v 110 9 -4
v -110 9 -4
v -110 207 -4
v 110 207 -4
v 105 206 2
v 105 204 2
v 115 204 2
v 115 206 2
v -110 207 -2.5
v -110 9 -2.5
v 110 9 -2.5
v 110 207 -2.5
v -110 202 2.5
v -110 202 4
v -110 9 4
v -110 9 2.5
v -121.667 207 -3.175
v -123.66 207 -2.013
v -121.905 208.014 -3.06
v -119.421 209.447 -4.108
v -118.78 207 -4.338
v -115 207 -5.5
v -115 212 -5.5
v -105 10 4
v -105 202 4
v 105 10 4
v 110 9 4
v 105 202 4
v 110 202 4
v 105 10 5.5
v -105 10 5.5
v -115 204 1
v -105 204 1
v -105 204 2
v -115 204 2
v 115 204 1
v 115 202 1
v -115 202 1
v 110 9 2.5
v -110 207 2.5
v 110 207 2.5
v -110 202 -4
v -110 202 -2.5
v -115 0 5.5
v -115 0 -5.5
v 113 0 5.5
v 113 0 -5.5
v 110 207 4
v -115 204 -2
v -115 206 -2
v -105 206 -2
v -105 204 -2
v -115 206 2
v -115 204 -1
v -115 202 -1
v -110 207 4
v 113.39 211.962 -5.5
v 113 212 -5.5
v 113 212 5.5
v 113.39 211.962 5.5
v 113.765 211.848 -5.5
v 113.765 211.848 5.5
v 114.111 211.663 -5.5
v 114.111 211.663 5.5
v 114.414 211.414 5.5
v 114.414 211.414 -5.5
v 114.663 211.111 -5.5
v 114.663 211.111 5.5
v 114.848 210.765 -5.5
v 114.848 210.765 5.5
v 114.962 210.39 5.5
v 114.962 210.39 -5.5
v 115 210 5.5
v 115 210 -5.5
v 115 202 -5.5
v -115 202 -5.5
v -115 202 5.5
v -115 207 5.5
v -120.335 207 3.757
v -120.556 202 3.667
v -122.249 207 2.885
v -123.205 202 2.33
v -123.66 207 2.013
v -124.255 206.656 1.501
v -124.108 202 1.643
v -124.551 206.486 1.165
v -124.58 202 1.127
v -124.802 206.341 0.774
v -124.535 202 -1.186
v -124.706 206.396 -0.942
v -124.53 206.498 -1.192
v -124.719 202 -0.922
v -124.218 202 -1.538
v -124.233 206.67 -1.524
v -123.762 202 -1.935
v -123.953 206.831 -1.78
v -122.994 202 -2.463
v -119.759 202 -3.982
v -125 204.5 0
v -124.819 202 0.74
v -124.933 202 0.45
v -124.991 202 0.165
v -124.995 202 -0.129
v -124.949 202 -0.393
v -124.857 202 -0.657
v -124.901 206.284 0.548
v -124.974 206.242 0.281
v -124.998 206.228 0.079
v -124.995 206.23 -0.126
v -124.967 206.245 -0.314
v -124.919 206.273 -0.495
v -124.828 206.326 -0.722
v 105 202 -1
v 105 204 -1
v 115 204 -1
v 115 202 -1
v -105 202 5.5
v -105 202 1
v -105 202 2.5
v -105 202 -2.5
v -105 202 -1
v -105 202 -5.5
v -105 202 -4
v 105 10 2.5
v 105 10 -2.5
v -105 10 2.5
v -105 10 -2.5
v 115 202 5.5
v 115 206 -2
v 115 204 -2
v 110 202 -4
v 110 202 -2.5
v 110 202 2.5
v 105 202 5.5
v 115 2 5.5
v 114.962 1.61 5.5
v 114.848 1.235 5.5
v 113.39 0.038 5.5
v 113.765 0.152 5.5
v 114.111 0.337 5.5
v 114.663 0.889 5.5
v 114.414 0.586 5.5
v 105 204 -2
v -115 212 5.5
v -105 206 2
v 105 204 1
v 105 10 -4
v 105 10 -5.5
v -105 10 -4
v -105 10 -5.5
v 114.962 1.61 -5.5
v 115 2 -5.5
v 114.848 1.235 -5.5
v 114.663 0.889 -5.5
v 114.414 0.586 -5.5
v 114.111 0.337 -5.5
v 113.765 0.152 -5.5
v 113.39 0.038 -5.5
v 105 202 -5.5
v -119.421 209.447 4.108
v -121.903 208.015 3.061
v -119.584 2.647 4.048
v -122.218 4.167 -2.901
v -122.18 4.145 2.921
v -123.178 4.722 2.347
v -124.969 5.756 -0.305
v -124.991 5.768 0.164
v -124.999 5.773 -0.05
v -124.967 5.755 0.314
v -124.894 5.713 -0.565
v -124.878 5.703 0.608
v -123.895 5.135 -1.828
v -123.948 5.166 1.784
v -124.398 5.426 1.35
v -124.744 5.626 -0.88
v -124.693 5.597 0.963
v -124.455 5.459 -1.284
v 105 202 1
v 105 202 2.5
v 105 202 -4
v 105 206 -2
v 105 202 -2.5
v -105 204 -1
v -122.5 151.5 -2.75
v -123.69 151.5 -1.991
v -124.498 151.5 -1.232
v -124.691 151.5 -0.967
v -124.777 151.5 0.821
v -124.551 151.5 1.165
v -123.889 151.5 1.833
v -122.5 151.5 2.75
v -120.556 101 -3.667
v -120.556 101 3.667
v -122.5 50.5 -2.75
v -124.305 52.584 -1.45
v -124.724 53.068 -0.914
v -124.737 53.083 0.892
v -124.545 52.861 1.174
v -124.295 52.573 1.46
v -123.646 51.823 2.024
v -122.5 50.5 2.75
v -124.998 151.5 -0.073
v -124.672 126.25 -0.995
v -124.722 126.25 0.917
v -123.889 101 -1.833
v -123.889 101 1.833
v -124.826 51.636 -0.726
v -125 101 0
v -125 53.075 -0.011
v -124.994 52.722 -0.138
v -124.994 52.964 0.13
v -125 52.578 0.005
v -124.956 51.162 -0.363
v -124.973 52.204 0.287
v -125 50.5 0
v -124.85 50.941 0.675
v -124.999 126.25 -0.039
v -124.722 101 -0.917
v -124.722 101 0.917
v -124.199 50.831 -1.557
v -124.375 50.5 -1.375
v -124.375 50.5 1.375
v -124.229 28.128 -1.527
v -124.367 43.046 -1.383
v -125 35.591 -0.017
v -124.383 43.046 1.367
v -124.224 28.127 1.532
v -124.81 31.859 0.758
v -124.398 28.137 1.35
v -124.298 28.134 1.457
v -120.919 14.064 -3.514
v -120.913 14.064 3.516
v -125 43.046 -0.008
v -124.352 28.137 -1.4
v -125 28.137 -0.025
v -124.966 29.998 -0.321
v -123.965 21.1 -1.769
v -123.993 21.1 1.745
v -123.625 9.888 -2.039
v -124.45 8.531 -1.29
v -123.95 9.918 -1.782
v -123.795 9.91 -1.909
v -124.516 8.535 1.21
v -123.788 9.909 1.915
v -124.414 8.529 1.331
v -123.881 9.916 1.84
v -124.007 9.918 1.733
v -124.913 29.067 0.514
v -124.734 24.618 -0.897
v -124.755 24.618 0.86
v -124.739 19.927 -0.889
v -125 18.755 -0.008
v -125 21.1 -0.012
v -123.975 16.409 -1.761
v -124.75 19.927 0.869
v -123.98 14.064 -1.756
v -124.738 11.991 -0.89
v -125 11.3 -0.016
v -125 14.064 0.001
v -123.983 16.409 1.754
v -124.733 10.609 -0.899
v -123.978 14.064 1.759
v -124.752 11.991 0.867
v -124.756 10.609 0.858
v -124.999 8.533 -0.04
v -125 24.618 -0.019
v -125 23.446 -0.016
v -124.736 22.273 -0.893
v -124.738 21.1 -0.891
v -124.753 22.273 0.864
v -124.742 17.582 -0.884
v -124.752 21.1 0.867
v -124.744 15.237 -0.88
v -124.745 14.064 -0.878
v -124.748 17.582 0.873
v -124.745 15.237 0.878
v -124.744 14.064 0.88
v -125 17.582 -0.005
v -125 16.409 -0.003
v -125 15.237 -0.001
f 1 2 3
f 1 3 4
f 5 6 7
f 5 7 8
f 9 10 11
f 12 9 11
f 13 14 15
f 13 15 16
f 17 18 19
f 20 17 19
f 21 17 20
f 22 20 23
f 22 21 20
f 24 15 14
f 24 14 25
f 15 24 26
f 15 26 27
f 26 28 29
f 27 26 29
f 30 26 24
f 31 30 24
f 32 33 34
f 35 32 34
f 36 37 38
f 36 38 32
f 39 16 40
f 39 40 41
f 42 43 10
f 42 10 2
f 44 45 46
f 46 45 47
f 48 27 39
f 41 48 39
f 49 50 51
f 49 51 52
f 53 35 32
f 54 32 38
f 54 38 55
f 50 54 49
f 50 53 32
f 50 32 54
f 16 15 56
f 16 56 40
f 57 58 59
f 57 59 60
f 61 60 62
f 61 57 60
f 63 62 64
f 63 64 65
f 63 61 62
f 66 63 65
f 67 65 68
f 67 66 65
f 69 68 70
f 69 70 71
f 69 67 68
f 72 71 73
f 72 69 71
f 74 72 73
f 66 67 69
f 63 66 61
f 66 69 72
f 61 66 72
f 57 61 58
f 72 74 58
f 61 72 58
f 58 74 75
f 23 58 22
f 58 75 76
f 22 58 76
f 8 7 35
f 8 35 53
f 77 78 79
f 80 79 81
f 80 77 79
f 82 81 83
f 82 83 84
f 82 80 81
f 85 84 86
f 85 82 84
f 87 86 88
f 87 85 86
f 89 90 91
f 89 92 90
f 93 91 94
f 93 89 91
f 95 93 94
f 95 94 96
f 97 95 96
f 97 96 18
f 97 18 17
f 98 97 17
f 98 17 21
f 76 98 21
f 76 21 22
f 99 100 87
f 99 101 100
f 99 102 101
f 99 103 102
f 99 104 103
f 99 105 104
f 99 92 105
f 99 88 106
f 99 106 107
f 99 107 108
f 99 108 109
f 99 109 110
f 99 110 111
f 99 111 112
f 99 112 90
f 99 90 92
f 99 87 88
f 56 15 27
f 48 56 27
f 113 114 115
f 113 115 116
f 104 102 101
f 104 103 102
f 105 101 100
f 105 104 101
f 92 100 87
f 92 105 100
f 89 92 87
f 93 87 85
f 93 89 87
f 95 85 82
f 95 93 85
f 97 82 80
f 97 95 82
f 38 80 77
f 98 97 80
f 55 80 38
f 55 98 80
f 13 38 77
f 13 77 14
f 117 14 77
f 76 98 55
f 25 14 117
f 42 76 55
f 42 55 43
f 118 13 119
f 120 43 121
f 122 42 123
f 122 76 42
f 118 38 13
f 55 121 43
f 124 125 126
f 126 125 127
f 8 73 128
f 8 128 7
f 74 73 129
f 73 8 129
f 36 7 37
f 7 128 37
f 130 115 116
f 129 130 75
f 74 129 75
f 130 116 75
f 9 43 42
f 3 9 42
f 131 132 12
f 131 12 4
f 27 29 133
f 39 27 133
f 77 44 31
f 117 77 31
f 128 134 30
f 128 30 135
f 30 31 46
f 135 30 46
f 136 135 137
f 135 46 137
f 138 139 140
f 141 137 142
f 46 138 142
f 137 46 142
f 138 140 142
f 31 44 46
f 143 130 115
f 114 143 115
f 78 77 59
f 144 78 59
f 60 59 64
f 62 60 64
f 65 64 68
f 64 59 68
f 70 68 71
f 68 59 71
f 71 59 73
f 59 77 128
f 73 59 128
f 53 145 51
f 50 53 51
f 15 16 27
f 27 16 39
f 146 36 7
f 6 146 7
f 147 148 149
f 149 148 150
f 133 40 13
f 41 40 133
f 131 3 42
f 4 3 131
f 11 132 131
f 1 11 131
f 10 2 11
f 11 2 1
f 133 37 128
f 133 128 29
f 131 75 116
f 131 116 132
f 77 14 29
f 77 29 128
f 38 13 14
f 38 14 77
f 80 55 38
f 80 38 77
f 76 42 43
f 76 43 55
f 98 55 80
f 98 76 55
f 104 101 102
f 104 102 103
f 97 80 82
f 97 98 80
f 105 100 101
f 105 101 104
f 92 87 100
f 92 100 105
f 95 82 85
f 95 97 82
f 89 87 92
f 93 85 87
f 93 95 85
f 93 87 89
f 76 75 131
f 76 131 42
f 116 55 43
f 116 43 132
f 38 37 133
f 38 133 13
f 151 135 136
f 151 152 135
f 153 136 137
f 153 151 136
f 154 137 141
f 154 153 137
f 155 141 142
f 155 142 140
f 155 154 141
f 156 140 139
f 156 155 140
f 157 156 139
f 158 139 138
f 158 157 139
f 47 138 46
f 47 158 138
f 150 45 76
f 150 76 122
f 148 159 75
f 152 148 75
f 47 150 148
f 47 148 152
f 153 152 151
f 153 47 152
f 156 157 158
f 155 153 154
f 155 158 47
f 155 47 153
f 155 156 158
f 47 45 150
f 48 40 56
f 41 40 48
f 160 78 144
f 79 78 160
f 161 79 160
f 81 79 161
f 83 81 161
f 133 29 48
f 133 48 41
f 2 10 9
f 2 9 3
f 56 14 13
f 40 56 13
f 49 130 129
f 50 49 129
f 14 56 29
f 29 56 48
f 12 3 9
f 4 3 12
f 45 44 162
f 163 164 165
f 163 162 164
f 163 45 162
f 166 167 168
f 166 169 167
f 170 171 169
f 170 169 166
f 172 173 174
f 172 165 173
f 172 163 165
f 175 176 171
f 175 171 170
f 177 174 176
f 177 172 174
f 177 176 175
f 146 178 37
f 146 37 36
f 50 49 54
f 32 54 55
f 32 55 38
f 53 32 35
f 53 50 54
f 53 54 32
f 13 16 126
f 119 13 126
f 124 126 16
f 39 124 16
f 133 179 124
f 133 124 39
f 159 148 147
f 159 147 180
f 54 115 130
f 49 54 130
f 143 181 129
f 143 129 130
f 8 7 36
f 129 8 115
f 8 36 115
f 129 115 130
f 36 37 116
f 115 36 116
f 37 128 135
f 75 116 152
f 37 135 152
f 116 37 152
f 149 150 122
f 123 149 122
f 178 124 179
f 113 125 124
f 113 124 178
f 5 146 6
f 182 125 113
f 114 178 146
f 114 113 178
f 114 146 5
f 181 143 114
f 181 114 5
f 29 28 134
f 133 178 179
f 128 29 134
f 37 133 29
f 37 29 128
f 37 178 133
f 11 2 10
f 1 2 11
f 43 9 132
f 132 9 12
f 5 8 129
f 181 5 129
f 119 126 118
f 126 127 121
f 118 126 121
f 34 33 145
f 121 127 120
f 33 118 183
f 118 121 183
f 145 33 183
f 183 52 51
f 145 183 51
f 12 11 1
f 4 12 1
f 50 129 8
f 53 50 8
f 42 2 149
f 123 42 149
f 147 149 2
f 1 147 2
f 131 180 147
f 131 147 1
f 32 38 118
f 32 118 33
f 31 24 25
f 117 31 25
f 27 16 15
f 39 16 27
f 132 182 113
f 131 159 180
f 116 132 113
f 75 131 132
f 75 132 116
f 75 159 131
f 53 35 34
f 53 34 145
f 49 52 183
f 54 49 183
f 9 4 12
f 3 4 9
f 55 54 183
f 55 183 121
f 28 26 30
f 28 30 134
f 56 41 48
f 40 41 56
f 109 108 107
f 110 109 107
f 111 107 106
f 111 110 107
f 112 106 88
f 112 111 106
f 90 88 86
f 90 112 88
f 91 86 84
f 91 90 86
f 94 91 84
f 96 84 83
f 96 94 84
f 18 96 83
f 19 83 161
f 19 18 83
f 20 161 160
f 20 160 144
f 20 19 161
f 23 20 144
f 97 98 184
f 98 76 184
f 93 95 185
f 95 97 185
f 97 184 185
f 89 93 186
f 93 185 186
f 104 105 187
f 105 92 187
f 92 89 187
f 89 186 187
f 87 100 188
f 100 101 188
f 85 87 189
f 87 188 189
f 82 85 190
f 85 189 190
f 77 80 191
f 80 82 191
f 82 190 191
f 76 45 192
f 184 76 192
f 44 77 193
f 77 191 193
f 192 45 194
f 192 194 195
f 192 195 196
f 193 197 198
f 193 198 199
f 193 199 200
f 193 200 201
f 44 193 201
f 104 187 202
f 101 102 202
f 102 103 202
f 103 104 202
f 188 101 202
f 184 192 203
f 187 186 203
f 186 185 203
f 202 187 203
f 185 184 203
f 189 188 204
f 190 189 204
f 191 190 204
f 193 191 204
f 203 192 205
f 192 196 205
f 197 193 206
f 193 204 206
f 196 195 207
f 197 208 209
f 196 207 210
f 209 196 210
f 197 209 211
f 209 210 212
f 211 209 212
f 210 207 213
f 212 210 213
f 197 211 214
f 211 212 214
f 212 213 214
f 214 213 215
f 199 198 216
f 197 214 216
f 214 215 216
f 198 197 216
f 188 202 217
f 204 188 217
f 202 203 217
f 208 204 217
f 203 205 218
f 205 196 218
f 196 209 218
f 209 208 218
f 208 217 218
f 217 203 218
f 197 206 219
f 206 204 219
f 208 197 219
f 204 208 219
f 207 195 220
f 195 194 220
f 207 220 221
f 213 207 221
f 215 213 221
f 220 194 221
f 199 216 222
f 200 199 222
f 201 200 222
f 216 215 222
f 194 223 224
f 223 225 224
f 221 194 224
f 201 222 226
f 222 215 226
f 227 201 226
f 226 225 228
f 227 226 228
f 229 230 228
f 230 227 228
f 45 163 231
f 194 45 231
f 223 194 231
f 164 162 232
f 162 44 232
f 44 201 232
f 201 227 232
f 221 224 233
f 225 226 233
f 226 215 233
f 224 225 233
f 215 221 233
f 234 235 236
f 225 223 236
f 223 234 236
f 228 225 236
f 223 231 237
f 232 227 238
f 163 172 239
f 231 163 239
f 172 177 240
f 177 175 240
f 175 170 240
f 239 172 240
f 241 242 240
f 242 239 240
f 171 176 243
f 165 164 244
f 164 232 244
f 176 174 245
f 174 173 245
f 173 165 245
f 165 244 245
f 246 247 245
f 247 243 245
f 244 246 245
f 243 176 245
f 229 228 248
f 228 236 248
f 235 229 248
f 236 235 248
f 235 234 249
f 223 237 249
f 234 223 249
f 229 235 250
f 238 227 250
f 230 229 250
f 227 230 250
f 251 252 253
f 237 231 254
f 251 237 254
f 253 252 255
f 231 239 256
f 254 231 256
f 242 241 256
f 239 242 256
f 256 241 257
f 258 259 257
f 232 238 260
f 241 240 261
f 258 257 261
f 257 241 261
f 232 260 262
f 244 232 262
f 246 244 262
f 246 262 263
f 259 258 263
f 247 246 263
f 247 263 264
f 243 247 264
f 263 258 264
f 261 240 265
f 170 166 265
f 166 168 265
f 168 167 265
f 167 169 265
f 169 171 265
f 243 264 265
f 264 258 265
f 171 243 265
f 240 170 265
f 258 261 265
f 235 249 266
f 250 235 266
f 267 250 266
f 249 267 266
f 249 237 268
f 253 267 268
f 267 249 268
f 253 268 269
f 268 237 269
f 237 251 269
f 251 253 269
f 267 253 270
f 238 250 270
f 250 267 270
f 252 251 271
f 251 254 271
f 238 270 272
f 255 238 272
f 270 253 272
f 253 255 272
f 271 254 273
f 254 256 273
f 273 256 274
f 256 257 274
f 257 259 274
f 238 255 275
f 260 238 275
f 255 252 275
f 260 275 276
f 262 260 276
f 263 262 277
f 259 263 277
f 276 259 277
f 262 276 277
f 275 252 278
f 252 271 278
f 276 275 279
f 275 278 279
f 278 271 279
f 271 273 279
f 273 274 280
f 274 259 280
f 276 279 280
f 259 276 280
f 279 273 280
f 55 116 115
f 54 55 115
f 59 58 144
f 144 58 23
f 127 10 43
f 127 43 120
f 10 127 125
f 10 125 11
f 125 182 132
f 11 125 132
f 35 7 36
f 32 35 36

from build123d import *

# Parameters (mm, degrees)
SKETCH_2_W                 = 230
SKETCH_2_H                 = 11
EXTRUDE_1_DEPTH            = 212
SKETCH_3_W                 = 220
SKETCH_3_H                 = 1.5
CUT_EXTRUDE_1_DEPTH        = 198
SKETCH_4_W                 = 210
SKETCH_4_H                 = 192
CUT_EXTRUDE_2_DEPTH        = 203
EXTRUDE_2_DEPTH            = 212
DRAFT_START                = -7
DRAFT_4_DEPTH              = 14
SKETCH_6_W                 = 220
SKETCH_6_H                 = 1.5
EXTRUDE_3_DEPTH            = 198
EXTRUDE_3_2_DEPTH          = 198
FILLET_4_R                 = 2
SPLIT_START                = -2.5
SPLIT_BODIES_2_OUTLINE_W   = 220
SPLIT_BODIES_2_OUTLINE_H   = 5
SPLIT_BODIES_2_DEPTH       = 5
SPLIT_START_2              = -5.5
SPLIT_BODIES_2_2_OUTLINE_W = 220
SPLIT_BODIES_2_2_OUTLINE_H = 5
SPLIT_BODIES_2_2_DEPTH     = 1.5
SPLIT_START_3              = 4
SPLIT_BODIES_2_3_OUTLINE_W = 220
SPLIT_BODIES_2_3_OUTLINE_H = 5
SPLIT_BODIES_2_3_DEPTH     = 1.5
SPLIT_START_4              = 207
SPLIT_BODIES_2_4_DEPTH     = 5
SPLIT_START_5              = 202
SPLIT_BODIES_2_5_OUTLINE_W = 5
SPLIT_BODIES_2_5_OUTLINE_H = 11
SPLIT_BODIES_2_5_DEPTH     = 5
SPLIT_START_6              = -6
SPLIT_BODIES_2_6_DEPTH     = 12
SPLIT_BODIES_2_7_DEPTH     = 10
SKETCH_7_W                 = 2
SKETCH_7_H                 = 4
SKETCH_7_W_2               = 4
SKETCH_7_H_2               = 2
CUT_EXTRUDE_3_DEPTH        = 230
EXTRUDE_4_DEPTH            = 10
PATTERN_LINEAR_1_COUNT     = 2
PATTERN_LINEAR_1_PITCH     = 220


with BuildPart() as part:
    # Эскиз2 → Бобышка-Вытянуть1 (new body)
    with BuildSketch(Plane(origin=(0, 0, 0), x_dir=(1, 0, 0), z_dir=(0, 1, 0))):
        Rectangle(SKETCH_2_W, SKETCH_2_H)
    extrude(amount=EXTRUDE_1_DEPTH)

    # Эскиз3 → Вырез-Вытянуть1 (cut)
    with BuildSketch(Plane(origin=(0, 207, 0), x_dir=(1, 0, 0), z_dir=(0, 1, 0))):
        with Locations((0, 3.25)):
            Rectangle(SKETCH_3_W, SKETCH_3_H)
        with Locations((0, -3.25)):
            Rectangle(SKETCH_3_W, SKETCH_3_H)
    extrude(amount=-CUT_EXTRUDE_1_DEPTH, mode=Mode.SUBTRACT)

    # Эскиз4 → Вырез-Вытянуть2 (cut)
    with BuildSketch(Plane(origin=(0, 0, -5.5), x_dir=(-1, 0, 0), z_dir=(0, 0, -1))):
        with Locations((0, 106)):
            Rectangle(SKETCH_4_W, SKETCH_4_H)
    extrude(amount=-CUT_EXTRUDE_2_DEPTH, mode=Mode.SUBTRACT)


with BuildPart() as body_2:
    # Эскиз5 → Бобышка-Вытянуть2 (new body)
    with BuildSketch(Plane(origin=(0, 0, 0), x_dir=(-1, 0, 0), z_dir=(0, -1, 0))):
        with BuildLine():
            Line((115, -5.5), (115, 5.5))
            add(Edge.make_bspline(
                [(115, 5.5), (135, 0), (115, -5.5)],
                knots=[0, 0, 0, 1, 1, 1], degree=2))
        make_face()
    extrude(amount=-EXTRUDE_2_DEPTH)

    # Уклон4: read off the stored shape, not the designer's step
    # Уклон4 outline → Уклон4 (cut)
    with BuildSketch(Plane.XY.offset(DRAFT_START)):
        Polygon((-124.999999877, 206.226497379), (-115, 212), (-127, 212), (-127, 205.07179677), align=None)
        Polygon((-124.999999877, 5.773502621), (-127, 6.92820323), (-127, 0), (-115, 0), align=None)
    extrude(amount=DRAFT_4_DEPTH, mode=Mode.SUBTRACT)


with BuildPart() as part_1:
    add(part.part)

    # Combine 1: read off the stored shape, not the designer's step
    # Combine 1: union body 2
    add(body_2.part)

    # Скругление4
    fillet_4_edges = [part_1.edges().sort_by_distance(p)[0] for p in [
        (115, 0, 0),
        (115, 212, 0),
    ]]
    fillet(fillet_4_edges, radius=FILLET_4_R)

    # Split Bodies 2 7 outline → Split Bodies 2 7 (cut)
    with BuildSketch(Plane(origin=(0, 0, 0), x_dir=(1, 0, 0), z_dir=(0, 1, 0)).offset(SPLIT_START_5)):
        with BuildLine():
            Line((115, 5.5), (-115, 5.5))
            add(Edge.make_bspline(
                [(-115, -5.5), (-135, 0), (-115, 5.5)],
                knots=[0, 0, 0, 1, 1, 1], degree=2))
            Line((-115, -5.5), (115, -5.5))
            Line((115, -5.5), (115, 5.5))
        make_face()
    extrude(amount=SPLIT_BODIES_2_7_DEPTH, mode=Mode.SUBTRACT)

    # Эскиз8 → Бобышка-Вытянуть4 (add)
    with BuildSketch(Plane(origin=(115, 0, 0), x_dir=(0, 0, -1), z_dir=(1, 0, 0))):
        Polygon((-1, 202), (-1, 204), (-2, 204), (-2, 206), (2, 206), (2, 204), (1, 204), (1, 202), align=None)
    extrude_4 = extrude(amount=-EXTRUDE_4_DEPTH)

    # Линейный массив1: Бобышка-Вытянуть4 ×2
    with Locations(*[(-i * PATTERN_LINEAR_1_PITCH, 0, 0) for i in range(1, PATTERN_LINEAR_1_COUNT)]):
        add(extrude_4)


with BuildPart() as body_2_2:
    # Эскиз6 → Бобышка-Вытянуть3 (new body)
    with BuildSketch(Plane(origin=(0, 9, 0), x_dir=(1, 0, 0), z_dir=(0, 1, 0))):
        with Locations((0, 3.25)):
            Rectangle(SKETCH_6_W, SKETCH_6_H)
    extrude(amount=EXTRUDE_3_DEPTH)


with BuildPart() as body_3:
    # Эскиз6 → Extrude 3 2 (new body)
    with BuildSketch(Plane(origin=(0, 9, 0), x_dir=(1, 0, 0), z_dir=(0, 1, 0))):
        with Locations((0, -3.25)):
            Rectangle(SKETCH_6_W, SKETCH_6_H)
    extrude(amount=EXTRUDE_3_2_DEPTH)


with BuildPart() as body_4:
    # Split Bodies 2: read off the stored shape, not the designer's step
    # Split Bodies 2 outline → Split Bodies 2 (new body)
    with BuildSketch(Plane.XY.offset(SPLIT_START)):
        with Locations((0, 204.5)):
            Rectangle(SPLIT_BODIES_2_OUTLINE_W, SPLIT_BODIES_2_OUTLINE_H)
    extrude(amount=SPLIT_BODIES_2_DEPTH)

    # Split Bodies 2 2 outline → Split Bodies 2 2 (add)
    with BuildSketch(Plane.XY.offset(SPLIT_START_2)):
        with Locations((0, 204.5)):
            Rectangle(SPLIT_BODIES_2_2_OUTLINE_W, SPLIT_BODIES_2_2_OUTLINE_H)
    extrude(amount=SPLIT_BODIES_2_2_DEPTH)

    # Split Bodies 2 3 outline → Split Bodies 2 3 (add)
    with BuildSketch(Plane.XY.offset(SPLIT_START_3)):
        with Locations((0, 204.5)):
            Rectangle(SPLIT_BODIES_2_3_OUTLINE_W, SPLIT_BODIES_2_3_OUTLINE_H)
    extrude(amount=SPLIT_BODIES_2_3_DEPTH)

    # Split Bodies 2 4 outline → Split Bodies 2 4 (add)
    with BuildSketch(Plane(origin=(0, 0, 0), x_dir=(1, 0, 0), z_dir=(0, 1, 0)).offset(SPLIT_START_4)):
        with BuildLine():
            add(Edge.make_bspline(
                [(-115, -5.5), (-135, 0), (-115, 5.5)],
                knots=[0, 0, 0, 1, 1, 1], degree=2))
            Line((-115, -5.5), (115, -5.5))
            Line((115, -5.5), (115, 5.5))
            Line((115, 5.5), (-115, 5.5))
        make_face()
    extrude(amount=SPLIT_BODIES_2_4_DEPTH)

    # Split Bodies 2 5 outline → Split Bodies 2 5 (add)
    with BuildSketch(Plane(origin=(0, 0, 0), x_dir=(1, 0, 0), z_dir=(0, 1, 0)).offset(SPLIT_START_5)):
        with BuildLine():
            add(Edge.make_bspline(
                [(-115, -5.5), (-135, 0), (-115, 5.5)],
                knots=[0, 0, 0, 1, 1, 1], degree=2))
            Line((-115, -5.5), (-110, -5.5))
            Line((-110, -5.5), (-110, 5.5))
            Line((-110, 5.5), (-115, 5.5))
        make_face()
        with Locations((112.5, 0)):
            Rectangle(SPLIT_BODIES_2_5_OUTLINE_W, SPLIT_BODIES_2_5_OUTLINE_H)
    extrude(amount=SPLIT_BODIES_2_5_DEPTH)

    # Split Bodies 2 6 outline → Split Bodies 2 6 (cut)
    with BuildSketch(Plane.XY.offset(SPLIT_START_6)):
        with BuildLine():
            Line((-111.535898385, 214), (-115, 212))
            Line((-115, 212), (113, 212))
            ThreePointArc((113, 212), (114.414213562, 211.414213562), (115, 210))
            Line((115, 210), (115, 214))
            Line((115, 214), (-111.535898385, 214))
        make_face()
        Polygon((-124.999999877, 206.226497379), (-115, 212), (-126, 212.000000152), (-126, 205.649147039), align=None)
    extrude(amount=SPLIT_BODIES_2_6_DEPTH, mode=Mode.SUBTRACT)

    # Эскиз7 → Вырез-Вытянуть3 (cut)
    with BuildSketch(Plane(origin=(115, 0, 0), x_dir=(0, 0, -1), z_dir=(1, 0, 0))):
        with Locations((0, 204)):
            Rectangle(SKETCH_7_W, SKETCH_7_H)
        with Locations((0, 205)):
            Rectangle(SKETCH_7_W_2, SKETCH_7_H_2)
    extrude(amount=-CUT_EXTRUDE_3_DEPTH, mode=Mode.SUBTRACT)


solid = Compound([part_1.part, body_2_2.part, body_3.part, body_4.part])
